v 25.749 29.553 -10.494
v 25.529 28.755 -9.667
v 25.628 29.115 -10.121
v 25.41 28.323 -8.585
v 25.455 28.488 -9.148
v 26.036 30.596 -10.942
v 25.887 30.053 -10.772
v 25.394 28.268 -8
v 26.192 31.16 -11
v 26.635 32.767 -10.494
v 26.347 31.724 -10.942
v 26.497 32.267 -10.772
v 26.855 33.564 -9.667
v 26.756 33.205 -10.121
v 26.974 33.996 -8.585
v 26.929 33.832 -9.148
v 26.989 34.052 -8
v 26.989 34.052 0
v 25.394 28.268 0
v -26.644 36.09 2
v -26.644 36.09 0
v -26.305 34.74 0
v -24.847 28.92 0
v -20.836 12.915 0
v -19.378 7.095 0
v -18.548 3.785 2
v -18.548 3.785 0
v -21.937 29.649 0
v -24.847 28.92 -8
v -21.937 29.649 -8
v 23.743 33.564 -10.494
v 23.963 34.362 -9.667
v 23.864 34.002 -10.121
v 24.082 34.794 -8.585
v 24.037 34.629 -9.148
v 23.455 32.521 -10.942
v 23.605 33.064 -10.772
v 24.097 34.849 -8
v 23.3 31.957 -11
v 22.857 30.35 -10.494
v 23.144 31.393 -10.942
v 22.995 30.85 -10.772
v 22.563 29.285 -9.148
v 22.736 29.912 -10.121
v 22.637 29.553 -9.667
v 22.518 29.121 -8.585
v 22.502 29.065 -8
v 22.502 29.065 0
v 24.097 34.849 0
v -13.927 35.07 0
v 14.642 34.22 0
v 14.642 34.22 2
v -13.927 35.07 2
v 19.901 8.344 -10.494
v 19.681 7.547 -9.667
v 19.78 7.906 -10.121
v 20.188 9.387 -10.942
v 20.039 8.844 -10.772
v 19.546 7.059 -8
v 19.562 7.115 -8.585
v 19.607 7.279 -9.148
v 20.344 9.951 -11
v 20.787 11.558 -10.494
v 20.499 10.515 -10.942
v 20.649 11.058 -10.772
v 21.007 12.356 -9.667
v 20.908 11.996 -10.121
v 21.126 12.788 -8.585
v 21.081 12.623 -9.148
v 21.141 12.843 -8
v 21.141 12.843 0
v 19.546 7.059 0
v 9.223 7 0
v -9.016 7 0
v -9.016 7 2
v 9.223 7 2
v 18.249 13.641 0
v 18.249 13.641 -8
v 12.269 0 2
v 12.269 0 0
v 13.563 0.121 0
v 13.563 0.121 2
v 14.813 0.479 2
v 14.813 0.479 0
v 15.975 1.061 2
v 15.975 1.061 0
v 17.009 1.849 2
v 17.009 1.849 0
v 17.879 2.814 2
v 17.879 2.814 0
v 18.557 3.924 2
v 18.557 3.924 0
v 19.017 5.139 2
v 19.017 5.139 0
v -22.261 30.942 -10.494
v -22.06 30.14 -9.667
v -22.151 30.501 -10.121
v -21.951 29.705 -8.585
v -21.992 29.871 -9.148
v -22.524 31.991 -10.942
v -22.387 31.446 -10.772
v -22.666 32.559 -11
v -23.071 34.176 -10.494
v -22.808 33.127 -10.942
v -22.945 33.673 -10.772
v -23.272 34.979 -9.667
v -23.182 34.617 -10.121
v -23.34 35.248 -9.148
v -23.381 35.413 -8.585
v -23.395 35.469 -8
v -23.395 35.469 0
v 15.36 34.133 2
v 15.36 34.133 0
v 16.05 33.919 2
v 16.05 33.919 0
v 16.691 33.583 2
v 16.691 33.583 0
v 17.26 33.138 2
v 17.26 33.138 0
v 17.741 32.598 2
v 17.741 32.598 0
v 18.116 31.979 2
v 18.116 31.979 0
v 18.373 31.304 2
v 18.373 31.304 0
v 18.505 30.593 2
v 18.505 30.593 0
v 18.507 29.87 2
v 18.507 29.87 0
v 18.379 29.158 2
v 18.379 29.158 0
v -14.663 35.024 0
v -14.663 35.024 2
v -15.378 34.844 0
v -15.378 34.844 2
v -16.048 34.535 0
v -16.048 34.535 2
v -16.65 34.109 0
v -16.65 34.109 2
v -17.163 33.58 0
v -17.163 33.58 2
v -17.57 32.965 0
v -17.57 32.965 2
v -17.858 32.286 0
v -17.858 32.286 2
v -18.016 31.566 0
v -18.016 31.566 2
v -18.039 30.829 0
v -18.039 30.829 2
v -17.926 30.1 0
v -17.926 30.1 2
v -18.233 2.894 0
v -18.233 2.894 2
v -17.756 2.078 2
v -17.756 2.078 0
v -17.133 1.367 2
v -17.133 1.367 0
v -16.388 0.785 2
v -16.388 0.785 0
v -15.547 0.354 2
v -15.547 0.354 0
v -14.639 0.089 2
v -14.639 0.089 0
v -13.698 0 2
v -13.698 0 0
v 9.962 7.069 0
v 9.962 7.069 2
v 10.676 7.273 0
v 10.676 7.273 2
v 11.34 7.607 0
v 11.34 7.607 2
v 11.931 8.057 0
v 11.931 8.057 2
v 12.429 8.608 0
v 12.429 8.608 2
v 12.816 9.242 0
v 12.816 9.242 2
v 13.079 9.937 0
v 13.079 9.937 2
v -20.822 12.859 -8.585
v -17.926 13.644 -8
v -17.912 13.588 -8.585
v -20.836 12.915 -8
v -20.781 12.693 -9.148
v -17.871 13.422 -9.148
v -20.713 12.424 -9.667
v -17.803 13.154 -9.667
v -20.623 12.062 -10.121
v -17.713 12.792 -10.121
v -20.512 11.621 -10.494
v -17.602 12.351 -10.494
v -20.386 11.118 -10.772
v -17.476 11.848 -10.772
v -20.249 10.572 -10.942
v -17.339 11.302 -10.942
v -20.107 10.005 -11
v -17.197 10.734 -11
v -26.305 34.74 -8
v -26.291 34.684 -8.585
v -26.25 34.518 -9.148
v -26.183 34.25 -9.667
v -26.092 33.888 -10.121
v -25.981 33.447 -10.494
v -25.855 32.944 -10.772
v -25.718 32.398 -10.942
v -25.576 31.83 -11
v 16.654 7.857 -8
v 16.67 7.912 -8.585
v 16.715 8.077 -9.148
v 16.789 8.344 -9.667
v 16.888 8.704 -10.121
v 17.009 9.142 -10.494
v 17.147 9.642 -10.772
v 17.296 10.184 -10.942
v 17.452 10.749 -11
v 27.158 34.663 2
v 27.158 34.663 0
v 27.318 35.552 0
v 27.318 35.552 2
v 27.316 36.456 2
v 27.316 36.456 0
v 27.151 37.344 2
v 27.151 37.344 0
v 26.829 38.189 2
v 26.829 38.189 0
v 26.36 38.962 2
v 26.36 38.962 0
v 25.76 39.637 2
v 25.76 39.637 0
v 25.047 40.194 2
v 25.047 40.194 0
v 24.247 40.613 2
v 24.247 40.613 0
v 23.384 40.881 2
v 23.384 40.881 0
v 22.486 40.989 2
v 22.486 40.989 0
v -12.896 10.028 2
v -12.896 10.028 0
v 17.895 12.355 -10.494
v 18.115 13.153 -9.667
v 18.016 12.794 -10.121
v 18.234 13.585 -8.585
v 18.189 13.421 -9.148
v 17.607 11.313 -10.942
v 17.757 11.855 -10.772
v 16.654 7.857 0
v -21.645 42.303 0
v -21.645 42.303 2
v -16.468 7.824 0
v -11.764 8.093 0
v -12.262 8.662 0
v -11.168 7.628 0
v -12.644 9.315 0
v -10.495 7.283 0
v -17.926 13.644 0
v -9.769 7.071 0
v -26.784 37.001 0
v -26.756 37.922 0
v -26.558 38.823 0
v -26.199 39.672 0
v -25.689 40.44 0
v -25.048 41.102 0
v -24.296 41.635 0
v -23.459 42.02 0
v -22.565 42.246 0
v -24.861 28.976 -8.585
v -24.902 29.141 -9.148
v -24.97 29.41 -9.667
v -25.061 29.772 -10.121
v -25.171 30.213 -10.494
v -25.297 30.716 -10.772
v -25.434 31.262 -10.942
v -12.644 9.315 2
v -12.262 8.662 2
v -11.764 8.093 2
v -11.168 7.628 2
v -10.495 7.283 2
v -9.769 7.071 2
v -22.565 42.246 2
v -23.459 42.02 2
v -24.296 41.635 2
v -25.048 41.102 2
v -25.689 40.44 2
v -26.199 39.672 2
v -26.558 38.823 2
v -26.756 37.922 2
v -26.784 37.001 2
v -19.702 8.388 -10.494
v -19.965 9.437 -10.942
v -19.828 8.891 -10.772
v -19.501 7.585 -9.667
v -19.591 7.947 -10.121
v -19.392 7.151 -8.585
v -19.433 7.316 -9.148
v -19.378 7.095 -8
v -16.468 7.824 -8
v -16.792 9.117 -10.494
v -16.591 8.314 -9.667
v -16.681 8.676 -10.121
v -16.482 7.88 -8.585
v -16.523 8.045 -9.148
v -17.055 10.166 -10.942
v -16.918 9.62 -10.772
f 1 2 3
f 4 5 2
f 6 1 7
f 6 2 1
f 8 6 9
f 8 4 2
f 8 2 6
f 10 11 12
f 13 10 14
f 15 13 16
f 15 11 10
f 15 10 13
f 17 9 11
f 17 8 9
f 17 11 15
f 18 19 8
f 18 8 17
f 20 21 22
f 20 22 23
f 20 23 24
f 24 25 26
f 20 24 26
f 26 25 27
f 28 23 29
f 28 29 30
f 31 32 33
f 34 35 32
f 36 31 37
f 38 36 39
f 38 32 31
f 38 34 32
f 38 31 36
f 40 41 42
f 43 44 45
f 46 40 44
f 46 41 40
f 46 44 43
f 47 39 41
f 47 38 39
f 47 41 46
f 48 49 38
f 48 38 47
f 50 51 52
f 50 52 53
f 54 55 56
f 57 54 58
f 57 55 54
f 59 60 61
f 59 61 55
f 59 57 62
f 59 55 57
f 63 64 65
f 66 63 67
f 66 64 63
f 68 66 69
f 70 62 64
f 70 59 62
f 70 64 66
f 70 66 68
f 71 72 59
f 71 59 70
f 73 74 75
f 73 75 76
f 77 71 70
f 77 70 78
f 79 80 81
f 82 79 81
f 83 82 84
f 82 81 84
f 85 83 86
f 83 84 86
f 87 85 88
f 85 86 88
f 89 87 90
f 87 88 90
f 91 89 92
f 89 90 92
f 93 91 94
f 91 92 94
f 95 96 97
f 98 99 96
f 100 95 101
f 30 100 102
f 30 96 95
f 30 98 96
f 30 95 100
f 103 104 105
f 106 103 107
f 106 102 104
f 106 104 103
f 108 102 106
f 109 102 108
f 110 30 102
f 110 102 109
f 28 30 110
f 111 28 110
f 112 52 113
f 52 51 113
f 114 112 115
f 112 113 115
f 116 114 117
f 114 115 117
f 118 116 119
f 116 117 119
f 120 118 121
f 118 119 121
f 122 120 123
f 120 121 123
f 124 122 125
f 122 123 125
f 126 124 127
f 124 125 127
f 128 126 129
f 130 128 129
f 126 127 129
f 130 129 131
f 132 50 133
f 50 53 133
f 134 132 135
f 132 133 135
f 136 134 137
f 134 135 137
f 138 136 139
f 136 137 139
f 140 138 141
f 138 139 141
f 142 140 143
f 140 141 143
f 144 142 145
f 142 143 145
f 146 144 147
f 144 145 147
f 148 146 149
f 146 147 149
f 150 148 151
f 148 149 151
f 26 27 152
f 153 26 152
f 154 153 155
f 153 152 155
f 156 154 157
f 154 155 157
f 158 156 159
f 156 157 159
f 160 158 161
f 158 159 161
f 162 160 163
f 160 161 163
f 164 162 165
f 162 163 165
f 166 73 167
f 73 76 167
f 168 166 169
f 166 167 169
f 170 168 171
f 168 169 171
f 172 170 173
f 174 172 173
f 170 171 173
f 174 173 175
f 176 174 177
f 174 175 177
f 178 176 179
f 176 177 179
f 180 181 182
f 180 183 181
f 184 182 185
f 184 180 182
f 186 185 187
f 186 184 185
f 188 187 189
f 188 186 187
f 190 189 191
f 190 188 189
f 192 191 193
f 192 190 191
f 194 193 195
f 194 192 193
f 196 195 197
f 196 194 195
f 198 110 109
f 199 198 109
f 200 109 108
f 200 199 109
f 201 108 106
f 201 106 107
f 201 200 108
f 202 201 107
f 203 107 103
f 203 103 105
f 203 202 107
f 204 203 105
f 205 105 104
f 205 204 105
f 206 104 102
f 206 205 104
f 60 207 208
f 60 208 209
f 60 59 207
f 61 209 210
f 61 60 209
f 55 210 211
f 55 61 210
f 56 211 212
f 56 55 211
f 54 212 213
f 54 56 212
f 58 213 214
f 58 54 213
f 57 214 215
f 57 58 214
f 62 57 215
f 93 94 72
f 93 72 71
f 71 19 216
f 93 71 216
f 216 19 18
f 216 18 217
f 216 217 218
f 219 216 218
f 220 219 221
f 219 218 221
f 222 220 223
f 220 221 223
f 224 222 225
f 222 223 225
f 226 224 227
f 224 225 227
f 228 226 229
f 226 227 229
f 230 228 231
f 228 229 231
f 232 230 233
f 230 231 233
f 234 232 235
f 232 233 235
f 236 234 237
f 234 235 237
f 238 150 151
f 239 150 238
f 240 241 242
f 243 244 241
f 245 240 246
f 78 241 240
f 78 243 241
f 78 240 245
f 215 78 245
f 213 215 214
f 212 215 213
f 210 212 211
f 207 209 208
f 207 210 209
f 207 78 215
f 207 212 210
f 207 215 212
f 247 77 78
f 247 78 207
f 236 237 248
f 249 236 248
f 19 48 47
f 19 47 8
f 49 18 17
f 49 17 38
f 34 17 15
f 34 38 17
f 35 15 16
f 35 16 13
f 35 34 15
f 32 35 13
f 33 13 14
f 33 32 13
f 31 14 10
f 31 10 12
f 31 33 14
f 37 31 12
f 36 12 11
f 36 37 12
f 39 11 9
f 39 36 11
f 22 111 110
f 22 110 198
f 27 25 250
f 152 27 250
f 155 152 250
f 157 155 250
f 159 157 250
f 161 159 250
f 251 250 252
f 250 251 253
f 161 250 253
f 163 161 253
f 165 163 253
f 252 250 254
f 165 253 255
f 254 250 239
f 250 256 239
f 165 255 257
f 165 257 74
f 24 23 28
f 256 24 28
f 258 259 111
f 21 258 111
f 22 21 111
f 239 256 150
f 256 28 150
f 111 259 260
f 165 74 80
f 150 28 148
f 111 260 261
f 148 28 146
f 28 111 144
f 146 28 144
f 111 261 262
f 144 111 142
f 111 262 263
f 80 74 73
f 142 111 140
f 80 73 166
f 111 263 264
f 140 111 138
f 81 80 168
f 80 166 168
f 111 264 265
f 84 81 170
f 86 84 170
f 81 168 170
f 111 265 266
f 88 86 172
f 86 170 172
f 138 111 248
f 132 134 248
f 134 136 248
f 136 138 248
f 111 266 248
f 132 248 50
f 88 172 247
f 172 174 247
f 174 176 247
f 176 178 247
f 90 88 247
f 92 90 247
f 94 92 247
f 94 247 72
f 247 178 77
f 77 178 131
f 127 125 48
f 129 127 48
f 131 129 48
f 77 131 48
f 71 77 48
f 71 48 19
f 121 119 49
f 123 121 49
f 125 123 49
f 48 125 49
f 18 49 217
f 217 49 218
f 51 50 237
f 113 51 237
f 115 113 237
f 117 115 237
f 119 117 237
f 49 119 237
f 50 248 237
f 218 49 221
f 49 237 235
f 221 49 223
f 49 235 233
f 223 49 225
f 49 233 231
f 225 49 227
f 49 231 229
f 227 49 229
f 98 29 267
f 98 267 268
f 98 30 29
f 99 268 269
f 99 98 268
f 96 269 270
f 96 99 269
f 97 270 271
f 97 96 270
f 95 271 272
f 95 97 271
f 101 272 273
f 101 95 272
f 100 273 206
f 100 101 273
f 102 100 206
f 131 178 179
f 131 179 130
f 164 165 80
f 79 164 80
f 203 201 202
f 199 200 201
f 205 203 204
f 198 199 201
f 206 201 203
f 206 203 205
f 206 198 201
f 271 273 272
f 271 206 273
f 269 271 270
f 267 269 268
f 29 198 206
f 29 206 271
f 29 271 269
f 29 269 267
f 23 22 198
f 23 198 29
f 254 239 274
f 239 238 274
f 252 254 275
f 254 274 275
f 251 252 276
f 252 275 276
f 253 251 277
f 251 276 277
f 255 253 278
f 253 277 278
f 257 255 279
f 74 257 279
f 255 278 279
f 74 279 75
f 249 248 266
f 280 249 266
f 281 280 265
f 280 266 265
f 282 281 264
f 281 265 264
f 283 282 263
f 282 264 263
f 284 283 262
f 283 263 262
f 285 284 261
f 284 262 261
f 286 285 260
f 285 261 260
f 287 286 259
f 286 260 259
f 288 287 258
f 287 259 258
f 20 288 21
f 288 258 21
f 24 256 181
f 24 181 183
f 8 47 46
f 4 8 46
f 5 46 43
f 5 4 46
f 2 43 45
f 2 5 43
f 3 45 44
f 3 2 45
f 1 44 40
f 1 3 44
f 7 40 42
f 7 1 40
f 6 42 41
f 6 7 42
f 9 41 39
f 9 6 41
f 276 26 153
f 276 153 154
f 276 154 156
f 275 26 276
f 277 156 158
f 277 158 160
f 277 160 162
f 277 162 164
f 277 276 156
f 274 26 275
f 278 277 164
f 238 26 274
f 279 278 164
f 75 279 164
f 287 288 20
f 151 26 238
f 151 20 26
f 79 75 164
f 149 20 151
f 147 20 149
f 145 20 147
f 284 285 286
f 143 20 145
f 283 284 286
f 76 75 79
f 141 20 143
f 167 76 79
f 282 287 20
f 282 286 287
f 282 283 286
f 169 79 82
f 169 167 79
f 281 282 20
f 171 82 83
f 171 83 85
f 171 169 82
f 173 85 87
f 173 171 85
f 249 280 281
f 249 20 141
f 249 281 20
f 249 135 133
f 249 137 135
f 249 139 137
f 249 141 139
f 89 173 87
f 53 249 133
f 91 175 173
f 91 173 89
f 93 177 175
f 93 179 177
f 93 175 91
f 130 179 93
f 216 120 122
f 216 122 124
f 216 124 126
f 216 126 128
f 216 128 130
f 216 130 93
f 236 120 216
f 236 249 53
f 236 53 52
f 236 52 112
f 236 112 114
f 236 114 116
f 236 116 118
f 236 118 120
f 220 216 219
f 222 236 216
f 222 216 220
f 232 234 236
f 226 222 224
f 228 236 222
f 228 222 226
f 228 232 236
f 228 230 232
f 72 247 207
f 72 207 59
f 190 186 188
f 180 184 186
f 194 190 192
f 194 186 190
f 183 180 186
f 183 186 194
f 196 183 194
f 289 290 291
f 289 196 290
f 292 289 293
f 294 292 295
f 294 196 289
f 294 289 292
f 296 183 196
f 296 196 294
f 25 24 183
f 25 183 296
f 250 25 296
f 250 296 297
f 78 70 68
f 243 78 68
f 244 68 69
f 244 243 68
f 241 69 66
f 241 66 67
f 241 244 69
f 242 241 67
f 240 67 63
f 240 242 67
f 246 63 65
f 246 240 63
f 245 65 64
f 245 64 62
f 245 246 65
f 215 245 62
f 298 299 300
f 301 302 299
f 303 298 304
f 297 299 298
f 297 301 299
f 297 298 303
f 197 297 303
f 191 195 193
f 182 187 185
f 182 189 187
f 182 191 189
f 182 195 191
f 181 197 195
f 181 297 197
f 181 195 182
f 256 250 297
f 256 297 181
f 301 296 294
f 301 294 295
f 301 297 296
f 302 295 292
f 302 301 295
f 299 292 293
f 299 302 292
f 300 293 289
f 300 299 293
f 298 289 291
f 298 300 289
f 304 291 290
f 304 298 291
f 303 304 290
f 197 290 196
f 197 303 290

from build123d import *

# Parameters (mm, degrees)
F2_DEPTH = 2
F3_T     = 7
F4_R     = 4
F6_DEPTH = 11
F7_R     = 2.99999


# Not quite as in the source:
# - a fillet or chamfer is up to 0.001 mm smaller than in the source, because OpenCascade refuses the exact size
# - a shell that OpenCascade refuses in one call is made with other operations: the cavity is built on its own and cut out


with BuildPart() as f2:
    # F1 (on Top) → F2 (new body)
    with BuildSketch(Plane.XY):
        with BuildLine():
            ThreePointArc((-21.6449442268, 42.3033521048), (-25.6894079684, 40.4398561051), (-26.6437804137, 36.0902035288))
            Line((-26.6437804137, 36.0902035288), (-18.5483854863, 3.7846369171))
            ThreePointArc((-18.5483854863, 3.7846369171), (-16.7743151531, 1.0581212972), (-13.6983450146, 0))
            Line((-13.6983450146, 0), (12.2689166074, 0))
            ThreePointArc((12.2689166074, 0), (16.5100865033, 1.4311152002), (19.017084198, 5.1392920247))
            Line((19.017084198, 5.1392920247), (27.1577014469, 34.6625972473))
            ThreePointArc((27.1577014469, 34.6625972473), (26.3599974025, 38.9615518502), (22.4863774545, 40.9894598656))
            Line((22.4863774545, 40.9894598656), (-21.6449442268, 42.3033521048))
        make_face()
    extrude(amount=F2_DEPTH)

    # F3: shell of thickness 7, made by hand


with BuildPart() as f3_core1:
    # F3_t2: copy of F2
    add(f2.part)

    # the walls: a layer under each face that stays
    f3_faces = [f3_core1.faces().sort_by_distance(p)[0] for p in [
        (0.4207166138, 41.6464059852, 1),
        (-22.59608295, 19.937420223, 1),
        (-0.7147142036, 0, 1),
        (23.0873928224, 19.900944636, 1),
    ]]
    thicken(f3_faces, amount=-F3_T, mode=Mode.SUBTRACT)


with BuildPart() as f2_1:
    add(f2.part)

    # what is left inside the walls is the cavity
    f3_cavity = [f3_core1.part.solids().sort_by_distance(p)[0] for p in [
        (0.260689, 16.409264, 0.07),
    ]]
    add(f3_cavity, mode=Mode.SUBTRACT)

    # F4
    f4_edges = [f2_1.edges().sort_by_distance(p)[0] for p in [
        (19.732614, 34.068344, 1),
        (-19.211236, 35.227793, 1),
        (-12.137683, 7, 1),
        (12.268917, 7, 1),
    ]]
    fillet(f4_edges, radius=F4_R)

    # F5 (on face) → F6 (join)
    with BuildSketch(Plane.XY):
        Polygon((-23.3953947844, 35.4691530951), (-26.3054190674, 34.7399352453), (-24.8469833679, 28.9198866794), (-21.9369590849, 29.6491045291), align=None)
        Polygon((25.3943994744, 28.2676887604), (26.9892920247, 34.0518324094), (24.0972202001, 34.8492786846), (22.5023276498, 29.0651350355), align=None)
        Polygon((-19.3778494948, 7.0947045569), (-16.4678252118, 7.8239224066), (-17.9262609113, 13.6439709726), (-20.8362851943, 12.9147531229), align=None)
        Polygon((18.249280849, 13.6407519713), (16.6543882988, 7.8566083223), (19.5464601233, 7.0591620471), (21.1413526736, 12.8433056962), align=None)
    extrude(amount=-F6_DEPTH)

    # F7 (radius 3 in the source; OpenCascade refuses exactly that, so slightly less here)
    f7_edges = [f2_1.edges().sort_by_distance(p)[0] for p in [
        (25.543256, 34.450556, -11),
        (23.948364, 28.666412, -11),
        (19.695317, 13.242029, -11),
        (18.100424, 7.457885, -11),
        (-17.922837, 7.459313, -11),
        (-19.381273, 13.279362, -11),
        (-23.391971, 29.284496, -11),
        (-24.850407, 35.104544, -11),
    ]]
    fillet(f7_edges, radius=F7_R)


solid = f2_1.part
